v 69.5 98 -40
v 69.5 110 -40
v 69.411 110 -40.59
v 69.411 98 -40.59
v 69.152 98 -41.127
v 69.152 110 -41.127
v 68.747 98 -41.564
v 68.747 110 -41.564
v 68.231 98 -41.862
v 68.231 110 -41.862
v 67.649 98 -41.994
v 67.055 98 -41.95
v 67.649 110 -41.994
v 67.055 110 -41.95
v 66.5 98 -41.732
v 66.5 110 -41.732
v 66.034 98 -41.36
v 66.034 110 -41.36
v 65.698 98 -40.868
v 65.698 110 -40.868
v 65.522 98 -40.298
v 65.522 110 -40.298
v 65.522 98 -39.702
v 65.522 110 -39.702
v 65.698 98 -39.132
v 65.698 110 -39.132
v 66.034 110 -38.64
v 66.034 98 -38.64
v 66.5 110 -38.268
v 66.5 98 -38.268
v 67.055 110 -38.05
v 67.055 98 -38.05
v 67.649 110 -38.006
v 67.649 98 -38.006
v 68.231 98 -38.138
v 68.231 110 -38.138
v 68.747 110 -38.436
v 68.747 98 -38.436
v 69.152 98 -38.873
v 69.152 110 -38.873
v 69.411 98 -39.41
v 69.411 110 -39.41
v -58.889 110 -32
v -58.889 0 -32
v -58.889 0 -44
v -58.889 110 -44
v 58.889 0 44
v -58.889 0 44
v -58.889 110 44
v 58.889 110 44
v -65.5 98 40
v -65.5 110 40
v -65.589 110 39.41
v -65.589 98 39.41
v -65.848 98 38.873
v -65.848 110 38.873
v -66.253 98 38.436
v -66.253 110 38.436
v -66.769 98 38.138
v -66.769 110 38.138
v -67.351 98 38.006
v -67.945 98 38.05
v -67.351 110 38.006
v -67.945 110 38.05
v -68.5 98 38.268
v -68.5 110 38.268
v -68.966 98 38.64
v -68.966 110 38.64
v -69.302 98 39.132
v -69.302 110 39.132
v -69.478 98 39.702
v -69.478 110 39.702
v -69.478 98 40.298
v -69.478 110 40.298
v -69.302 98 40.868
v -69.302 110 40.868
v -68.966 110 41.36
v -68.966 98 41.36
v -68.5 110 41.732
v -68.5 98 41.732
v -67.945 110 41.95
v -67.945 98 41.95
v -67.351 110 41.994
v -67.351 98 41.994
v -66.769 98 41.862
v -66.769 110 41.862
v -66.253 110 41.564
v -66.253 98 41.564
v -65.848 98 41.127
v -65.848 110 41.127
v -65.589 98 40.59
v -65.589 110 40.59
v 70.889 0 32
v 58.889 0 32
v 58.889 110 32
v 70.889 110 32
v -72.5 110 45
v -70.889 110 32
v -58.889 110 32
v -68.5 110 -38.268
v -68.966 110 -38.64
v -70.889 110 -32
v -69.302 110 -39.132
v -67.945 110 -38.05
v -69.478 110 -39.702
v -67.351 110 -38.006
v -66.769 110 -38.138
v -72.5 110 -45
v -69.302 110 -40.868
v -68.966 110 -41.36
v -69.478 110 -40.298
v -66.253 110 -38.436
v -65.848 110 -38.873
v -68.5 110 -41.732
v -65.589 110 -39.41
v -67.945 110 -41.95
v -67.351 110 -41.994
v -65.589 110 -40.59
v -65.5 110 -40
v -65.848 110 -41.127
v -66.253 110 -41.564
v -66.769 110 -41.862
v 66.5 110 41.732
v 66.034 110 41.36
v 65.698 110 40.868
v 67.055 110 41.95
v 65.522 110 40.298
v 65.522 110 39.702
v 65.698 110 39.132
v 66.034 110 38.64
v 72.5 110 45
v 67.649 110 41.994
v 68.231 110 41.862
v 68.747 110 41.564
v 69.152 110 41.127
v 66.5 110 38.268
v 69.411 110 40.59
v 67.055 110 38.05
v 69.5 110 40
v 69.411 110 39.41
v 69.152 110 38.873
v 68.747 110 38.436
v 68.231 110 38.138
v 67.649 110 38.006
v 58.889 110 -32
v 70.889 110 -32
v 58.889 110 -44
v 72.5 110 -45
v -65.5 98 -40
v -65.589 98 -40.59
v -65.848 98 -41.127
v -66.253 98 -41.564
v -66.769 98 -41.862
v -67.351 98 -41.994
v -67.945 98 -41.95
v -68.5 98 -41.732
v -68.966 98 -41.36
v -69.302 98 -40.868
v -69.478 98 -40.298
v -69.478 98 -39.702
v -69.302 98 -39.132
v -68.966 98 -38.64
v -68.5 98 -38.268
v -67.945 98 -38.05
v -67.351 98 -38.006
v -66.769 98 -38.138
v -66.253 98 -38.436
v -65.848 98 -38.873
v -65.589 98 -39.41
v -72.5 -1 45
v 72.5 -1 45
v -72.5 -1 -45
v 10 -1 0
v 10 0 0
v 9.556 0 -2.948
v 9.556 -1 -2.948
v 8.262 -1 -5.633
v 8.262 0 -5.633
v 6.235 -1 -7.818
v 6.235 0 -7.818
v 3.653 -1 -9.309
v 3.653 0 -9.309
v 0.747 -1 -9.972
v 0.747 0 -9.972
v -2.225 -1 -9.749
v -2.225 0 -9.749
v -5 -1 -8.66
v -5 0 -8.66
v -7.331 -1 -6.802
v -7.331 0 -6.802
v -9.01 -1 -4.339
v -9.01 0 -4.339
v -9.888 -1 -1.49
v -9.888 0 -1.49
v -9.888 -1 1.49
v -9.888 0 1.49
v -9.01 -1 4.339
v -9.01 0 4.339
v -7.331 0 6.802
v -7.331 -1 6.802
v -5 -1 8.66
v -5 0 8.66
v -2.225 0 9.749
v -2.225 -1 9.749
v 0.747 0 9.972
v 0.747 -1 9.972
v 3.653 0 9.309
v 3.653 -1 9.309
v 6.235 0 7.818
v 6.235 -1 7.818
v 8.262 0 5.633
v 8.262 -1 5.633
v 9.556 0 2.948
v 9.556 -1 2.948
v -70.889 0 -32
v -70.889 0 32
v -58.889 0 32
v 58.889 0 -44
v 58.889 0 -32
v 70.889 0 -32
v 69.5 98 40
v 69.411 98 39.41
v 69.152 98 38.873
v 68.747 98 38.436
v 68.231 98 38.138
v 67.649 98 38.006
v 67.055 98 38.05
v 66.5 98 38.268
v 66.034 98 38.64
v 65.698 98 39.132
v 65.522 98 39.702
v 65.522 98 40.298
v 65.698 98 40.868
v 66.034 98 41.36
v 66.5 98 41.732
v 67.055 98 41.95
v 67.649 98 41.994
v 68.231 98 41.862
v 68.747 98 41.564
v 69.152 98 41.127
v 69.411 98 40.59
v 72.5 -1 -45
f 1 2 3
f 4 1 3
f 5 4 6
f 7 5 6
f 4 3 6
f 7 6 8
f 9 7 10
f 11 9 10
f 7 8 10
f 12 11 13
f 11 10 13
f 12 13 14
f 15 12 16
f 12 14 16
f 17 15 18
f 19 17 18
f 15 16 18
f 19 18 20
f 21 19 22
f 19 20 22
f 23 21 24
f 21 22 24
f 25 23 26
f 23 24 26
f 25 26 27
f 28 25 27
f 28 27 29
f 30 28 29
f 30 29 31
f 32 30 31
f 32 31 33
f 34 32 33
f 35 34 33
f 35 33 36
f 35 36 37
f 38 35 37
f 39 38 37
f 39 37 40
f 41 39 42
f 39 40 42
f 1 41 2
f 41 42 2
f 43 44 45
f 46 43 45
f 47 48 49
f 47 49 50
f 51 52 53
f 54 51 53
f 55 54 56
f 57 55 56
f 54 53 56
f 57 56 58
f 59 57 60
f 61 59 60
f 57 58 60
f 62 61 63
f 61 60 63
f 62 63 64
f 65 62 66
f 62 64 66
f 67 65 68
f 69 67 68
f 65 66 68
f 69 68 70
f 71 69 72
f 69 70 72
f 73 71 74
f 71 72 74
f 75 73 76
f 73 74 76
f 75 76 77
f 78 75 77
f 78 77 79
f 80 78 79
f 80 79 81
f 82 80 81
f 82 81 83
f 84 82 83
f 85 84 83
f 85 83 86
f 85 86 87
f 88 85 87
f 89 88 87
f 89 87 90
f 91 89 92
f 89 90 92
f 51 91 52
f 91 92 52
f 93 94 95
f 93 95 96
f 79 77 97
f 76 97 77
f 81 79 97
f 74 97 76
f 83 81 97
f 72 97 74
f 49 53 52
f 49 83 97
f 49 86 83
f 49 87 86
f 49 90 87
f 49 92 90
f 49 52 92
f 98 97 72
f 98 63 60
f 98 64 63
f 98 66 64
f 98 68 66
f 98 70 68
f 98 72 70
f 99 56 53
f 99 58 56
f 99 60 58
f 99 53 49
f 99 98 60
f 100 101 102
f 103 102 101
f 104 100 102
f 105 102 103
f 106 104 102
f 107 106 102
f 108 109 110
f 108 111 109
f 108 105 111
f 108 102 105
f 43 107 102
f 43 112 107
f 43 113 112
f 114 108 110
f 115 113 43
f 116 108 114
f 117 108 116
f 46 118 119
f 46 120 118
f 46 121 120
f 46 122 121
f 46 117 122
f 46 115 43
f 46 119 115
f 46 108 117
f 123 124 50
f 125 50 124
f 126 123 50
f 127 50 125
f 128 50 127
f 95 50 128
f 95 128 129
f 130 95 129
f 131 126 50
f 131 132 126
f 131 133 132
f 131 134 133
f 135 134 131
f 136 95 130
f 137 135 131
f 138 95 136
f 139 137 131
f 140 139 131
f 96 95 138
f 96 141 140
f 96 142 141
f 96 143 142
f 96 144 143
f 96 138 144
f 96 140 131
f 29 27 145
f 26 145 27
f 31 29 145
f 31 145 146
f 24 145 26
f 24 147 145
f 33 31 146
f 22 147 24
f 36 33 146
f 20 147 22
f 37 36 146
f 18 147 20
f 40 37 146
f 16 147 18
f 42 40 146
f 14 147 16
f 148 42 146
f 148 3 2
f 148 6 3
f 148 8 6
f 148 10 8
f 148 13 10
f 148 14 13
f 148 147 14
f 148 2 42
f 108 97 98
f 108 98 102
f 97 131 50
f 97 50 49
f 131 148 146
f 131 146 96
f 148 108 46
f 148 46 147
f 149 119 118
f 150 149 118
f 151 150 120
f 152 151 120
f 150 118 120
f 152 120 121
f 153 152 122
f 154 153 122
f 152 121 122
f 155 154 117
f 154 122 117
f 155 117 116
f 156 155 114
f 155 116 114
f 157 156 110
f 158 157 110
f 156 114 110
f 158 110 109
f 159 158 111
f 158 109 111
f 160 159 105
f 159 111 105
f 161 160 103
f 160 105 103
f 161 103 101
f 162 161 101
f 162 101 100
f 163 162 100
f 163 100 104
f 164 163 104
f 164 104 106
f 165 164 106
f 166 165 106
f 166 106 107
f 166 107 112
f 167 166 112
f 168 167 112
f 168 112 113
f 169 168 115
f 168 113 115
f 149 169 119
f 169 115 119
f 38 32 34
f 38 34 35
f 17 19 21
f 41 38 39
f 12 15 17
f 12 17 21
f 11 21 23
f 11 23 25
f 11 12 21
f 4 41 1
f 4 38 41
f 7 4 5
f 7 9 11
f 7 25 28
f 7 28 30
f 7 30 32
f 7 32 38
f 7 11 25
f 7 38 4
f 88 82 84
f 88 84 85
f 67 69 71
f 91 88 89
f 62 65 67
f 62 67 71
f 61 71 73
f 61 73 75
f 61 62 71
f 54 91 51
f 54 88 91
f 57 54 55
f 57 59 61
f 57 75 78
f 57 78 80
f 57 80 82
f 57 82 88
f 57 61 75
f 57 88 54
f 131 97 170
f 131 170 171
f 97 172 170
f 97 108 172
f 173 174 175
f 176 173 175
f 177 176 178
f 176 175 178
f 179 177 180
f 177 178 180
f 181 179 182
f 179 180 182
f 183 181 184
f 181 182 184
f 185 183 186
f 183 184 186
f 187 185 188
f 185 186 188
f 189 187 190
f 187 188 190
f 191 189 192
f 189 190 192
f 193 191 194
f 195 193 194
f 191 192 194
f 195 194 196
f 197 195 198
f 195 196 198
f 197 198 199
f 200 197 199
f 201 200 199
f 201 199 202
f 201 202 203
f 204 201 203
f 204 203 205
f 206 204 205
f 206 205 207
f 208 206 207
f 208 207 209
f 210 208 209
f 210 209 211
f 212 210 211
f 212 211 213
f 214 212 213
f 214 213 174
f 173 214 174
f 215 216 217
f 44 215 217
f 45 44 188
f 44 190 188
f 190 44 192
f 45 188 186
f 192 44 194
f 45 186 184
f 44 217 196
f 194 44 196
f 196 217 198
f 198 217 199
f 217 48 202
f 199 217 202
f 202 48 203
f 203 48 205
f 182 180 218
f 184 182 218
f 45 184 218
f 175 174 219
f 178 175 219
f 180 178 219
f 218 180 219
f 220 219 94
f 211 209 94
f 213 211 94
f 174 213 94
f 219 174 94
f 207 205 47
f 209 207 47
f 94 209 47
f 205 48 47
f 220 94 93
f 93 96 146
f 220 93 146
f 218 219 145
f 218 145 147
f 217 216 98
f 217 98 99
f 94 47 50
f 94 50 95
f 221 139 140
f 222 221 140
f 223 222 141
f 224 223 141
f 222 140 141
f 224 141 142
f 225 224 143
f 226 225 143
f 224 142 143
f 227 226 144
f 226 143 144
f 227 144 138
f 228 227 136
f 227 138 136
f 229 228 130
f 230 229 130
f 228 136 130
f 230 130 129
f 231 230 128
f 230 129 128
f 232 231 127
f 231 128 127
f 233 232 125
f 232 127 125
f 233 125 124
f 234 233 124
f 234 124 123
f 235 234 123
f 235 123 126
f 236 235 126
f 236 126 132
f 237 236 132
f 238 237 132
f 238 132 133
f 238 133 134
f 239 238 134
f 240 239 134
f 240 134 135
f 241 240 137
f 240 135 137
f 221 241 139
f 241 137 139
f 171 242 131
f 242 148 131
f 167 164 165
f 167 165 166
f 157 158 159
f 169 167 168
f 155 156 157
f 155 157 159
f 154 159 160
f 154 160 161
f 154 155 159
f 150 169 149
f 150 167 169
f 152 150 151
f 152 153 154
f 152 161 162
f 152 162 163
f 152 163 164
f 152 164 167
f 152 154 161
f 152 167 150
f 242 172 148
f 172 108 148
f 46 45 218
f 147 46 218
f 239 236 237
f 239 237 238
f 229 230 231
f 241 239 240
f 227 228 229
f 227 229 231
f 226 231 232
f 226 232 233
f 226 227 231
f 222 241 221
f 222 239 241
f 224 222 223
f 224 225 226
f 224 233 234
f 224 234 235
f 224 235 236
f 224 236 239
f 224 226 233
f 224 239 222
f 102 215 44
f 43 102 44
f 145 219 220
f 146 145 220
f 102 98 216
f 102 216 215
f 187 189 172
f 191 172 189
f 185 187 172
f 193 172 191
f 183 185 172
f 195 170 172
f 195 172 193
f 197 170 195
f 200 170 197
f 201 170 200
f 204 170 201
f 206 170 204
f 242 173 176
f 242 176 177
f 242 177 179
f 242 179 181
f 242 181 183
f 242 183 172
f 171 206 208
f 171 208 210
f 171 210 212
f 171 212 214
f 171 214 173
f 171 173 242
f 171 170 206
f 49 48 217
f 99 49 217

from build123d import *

# Parameters (mm, degrees)
SKETCH3_W           = 145
SKETCH3_H           = 90
SKETCH3_W_2         = 141.777777778
SKETCH3_H_2         = 88
BOSS_EXTRUDE1_DEPTH = 110
SKETCH4_W           = 145
SKETCH4_H           = 90
BOSS_EXTRUDE2_DEPTH = 1
SKETCH5_W           = 12
SKETCH5_H           = 12
BOSS_EXTRUDE3_DEPTH = 110
SKETCH6_R           = 2
CUT_EXTRUDE1_DEPTH  = 12
SKETCH7_R           = 10
CUT_EXTRUDE2_DEPTH  = 12


with BuildPart() as part:
    # Sketch3 → Boss-Extrude1 (new body)
    with BuildSketch(Plane(origin=(0, 0, 0), x_dir=(1, 0, 0), z_dir=(0, 1, 0))):
        Rectangle(SKETCH3_W, SKETCH3_H)
        Rectangle(SKETCH3_W_2, SKETCH3_H_2, mode=Mode.SUBTRACT)
    extrude(amount=BOSS_EXTRUDE1_DEPTH)

    # Sketch4 → Boss-Extrude2 (add)
    with BuildSketch(Plane.XZ):
        Rectangle(SKETCH4_W, SKETCH4_H)
    extrude(amount=BOSS_EXTRUDE2_DEPTH)

    # Sketch5 → Boss-Extrude3 (add)
    with BuildSketch(Plane(origin=(0, 0, 0), x_dir=(1, 0, 0), z_dir=(0, 1, 0))):
        with Locations((-64.888888889, 38)):
            Rectangle(SKETCH5_W, SKETCH5_H)
        with Locations((64.888888889, 38)):
            Rectangle(SKETCH5_W, SKETCH5_H)
        with Locations((64.888888889, -38)):
            Rectangle(SKETCH5_W, SKETCH5_H)
        with Locations((-64.888888889, -38)):
            Rectangle(SKETCH5_W, SKETCH5_H)
    extrude(amount=BOSS_EXTRUDE3_DEPTH)

    # Sketch6 → Cut-Extrude1 (cut)
    with BuildSketch(Plane(origin=(0, 110, 0), x_dir=(1, 0, 0), z_dir=(0, 1, 0))):
        with Locations((-67.5, 40)):
            Circle(SKETCH6_R)
        with Locations((-67.5, -40)):
            Circle(SKETCH6_R)
        with Locations((67.5, -40)):
            Circle(SKETCH6_R)
        with Locations((67.5, 40)):
            Circle(SKETCH6_R)
    extrude(amount=-CUT_EXTRUDE1_DEPTH, mode=Mode.SUBTRACT)

    # Sketch7 → Cut-Extrude2 (cut)
    with BuildSketch(Plane(origin=(0, 0, 0), x_dir=(1, 0, 0), z_dir=(0, 1, 0))):
        Circle(SKETCH7_R)
    extrude(amount=-CUT_EXTRUDE2_DEPTH, mode=Mode.SUBTRACT)


solid = part.part
